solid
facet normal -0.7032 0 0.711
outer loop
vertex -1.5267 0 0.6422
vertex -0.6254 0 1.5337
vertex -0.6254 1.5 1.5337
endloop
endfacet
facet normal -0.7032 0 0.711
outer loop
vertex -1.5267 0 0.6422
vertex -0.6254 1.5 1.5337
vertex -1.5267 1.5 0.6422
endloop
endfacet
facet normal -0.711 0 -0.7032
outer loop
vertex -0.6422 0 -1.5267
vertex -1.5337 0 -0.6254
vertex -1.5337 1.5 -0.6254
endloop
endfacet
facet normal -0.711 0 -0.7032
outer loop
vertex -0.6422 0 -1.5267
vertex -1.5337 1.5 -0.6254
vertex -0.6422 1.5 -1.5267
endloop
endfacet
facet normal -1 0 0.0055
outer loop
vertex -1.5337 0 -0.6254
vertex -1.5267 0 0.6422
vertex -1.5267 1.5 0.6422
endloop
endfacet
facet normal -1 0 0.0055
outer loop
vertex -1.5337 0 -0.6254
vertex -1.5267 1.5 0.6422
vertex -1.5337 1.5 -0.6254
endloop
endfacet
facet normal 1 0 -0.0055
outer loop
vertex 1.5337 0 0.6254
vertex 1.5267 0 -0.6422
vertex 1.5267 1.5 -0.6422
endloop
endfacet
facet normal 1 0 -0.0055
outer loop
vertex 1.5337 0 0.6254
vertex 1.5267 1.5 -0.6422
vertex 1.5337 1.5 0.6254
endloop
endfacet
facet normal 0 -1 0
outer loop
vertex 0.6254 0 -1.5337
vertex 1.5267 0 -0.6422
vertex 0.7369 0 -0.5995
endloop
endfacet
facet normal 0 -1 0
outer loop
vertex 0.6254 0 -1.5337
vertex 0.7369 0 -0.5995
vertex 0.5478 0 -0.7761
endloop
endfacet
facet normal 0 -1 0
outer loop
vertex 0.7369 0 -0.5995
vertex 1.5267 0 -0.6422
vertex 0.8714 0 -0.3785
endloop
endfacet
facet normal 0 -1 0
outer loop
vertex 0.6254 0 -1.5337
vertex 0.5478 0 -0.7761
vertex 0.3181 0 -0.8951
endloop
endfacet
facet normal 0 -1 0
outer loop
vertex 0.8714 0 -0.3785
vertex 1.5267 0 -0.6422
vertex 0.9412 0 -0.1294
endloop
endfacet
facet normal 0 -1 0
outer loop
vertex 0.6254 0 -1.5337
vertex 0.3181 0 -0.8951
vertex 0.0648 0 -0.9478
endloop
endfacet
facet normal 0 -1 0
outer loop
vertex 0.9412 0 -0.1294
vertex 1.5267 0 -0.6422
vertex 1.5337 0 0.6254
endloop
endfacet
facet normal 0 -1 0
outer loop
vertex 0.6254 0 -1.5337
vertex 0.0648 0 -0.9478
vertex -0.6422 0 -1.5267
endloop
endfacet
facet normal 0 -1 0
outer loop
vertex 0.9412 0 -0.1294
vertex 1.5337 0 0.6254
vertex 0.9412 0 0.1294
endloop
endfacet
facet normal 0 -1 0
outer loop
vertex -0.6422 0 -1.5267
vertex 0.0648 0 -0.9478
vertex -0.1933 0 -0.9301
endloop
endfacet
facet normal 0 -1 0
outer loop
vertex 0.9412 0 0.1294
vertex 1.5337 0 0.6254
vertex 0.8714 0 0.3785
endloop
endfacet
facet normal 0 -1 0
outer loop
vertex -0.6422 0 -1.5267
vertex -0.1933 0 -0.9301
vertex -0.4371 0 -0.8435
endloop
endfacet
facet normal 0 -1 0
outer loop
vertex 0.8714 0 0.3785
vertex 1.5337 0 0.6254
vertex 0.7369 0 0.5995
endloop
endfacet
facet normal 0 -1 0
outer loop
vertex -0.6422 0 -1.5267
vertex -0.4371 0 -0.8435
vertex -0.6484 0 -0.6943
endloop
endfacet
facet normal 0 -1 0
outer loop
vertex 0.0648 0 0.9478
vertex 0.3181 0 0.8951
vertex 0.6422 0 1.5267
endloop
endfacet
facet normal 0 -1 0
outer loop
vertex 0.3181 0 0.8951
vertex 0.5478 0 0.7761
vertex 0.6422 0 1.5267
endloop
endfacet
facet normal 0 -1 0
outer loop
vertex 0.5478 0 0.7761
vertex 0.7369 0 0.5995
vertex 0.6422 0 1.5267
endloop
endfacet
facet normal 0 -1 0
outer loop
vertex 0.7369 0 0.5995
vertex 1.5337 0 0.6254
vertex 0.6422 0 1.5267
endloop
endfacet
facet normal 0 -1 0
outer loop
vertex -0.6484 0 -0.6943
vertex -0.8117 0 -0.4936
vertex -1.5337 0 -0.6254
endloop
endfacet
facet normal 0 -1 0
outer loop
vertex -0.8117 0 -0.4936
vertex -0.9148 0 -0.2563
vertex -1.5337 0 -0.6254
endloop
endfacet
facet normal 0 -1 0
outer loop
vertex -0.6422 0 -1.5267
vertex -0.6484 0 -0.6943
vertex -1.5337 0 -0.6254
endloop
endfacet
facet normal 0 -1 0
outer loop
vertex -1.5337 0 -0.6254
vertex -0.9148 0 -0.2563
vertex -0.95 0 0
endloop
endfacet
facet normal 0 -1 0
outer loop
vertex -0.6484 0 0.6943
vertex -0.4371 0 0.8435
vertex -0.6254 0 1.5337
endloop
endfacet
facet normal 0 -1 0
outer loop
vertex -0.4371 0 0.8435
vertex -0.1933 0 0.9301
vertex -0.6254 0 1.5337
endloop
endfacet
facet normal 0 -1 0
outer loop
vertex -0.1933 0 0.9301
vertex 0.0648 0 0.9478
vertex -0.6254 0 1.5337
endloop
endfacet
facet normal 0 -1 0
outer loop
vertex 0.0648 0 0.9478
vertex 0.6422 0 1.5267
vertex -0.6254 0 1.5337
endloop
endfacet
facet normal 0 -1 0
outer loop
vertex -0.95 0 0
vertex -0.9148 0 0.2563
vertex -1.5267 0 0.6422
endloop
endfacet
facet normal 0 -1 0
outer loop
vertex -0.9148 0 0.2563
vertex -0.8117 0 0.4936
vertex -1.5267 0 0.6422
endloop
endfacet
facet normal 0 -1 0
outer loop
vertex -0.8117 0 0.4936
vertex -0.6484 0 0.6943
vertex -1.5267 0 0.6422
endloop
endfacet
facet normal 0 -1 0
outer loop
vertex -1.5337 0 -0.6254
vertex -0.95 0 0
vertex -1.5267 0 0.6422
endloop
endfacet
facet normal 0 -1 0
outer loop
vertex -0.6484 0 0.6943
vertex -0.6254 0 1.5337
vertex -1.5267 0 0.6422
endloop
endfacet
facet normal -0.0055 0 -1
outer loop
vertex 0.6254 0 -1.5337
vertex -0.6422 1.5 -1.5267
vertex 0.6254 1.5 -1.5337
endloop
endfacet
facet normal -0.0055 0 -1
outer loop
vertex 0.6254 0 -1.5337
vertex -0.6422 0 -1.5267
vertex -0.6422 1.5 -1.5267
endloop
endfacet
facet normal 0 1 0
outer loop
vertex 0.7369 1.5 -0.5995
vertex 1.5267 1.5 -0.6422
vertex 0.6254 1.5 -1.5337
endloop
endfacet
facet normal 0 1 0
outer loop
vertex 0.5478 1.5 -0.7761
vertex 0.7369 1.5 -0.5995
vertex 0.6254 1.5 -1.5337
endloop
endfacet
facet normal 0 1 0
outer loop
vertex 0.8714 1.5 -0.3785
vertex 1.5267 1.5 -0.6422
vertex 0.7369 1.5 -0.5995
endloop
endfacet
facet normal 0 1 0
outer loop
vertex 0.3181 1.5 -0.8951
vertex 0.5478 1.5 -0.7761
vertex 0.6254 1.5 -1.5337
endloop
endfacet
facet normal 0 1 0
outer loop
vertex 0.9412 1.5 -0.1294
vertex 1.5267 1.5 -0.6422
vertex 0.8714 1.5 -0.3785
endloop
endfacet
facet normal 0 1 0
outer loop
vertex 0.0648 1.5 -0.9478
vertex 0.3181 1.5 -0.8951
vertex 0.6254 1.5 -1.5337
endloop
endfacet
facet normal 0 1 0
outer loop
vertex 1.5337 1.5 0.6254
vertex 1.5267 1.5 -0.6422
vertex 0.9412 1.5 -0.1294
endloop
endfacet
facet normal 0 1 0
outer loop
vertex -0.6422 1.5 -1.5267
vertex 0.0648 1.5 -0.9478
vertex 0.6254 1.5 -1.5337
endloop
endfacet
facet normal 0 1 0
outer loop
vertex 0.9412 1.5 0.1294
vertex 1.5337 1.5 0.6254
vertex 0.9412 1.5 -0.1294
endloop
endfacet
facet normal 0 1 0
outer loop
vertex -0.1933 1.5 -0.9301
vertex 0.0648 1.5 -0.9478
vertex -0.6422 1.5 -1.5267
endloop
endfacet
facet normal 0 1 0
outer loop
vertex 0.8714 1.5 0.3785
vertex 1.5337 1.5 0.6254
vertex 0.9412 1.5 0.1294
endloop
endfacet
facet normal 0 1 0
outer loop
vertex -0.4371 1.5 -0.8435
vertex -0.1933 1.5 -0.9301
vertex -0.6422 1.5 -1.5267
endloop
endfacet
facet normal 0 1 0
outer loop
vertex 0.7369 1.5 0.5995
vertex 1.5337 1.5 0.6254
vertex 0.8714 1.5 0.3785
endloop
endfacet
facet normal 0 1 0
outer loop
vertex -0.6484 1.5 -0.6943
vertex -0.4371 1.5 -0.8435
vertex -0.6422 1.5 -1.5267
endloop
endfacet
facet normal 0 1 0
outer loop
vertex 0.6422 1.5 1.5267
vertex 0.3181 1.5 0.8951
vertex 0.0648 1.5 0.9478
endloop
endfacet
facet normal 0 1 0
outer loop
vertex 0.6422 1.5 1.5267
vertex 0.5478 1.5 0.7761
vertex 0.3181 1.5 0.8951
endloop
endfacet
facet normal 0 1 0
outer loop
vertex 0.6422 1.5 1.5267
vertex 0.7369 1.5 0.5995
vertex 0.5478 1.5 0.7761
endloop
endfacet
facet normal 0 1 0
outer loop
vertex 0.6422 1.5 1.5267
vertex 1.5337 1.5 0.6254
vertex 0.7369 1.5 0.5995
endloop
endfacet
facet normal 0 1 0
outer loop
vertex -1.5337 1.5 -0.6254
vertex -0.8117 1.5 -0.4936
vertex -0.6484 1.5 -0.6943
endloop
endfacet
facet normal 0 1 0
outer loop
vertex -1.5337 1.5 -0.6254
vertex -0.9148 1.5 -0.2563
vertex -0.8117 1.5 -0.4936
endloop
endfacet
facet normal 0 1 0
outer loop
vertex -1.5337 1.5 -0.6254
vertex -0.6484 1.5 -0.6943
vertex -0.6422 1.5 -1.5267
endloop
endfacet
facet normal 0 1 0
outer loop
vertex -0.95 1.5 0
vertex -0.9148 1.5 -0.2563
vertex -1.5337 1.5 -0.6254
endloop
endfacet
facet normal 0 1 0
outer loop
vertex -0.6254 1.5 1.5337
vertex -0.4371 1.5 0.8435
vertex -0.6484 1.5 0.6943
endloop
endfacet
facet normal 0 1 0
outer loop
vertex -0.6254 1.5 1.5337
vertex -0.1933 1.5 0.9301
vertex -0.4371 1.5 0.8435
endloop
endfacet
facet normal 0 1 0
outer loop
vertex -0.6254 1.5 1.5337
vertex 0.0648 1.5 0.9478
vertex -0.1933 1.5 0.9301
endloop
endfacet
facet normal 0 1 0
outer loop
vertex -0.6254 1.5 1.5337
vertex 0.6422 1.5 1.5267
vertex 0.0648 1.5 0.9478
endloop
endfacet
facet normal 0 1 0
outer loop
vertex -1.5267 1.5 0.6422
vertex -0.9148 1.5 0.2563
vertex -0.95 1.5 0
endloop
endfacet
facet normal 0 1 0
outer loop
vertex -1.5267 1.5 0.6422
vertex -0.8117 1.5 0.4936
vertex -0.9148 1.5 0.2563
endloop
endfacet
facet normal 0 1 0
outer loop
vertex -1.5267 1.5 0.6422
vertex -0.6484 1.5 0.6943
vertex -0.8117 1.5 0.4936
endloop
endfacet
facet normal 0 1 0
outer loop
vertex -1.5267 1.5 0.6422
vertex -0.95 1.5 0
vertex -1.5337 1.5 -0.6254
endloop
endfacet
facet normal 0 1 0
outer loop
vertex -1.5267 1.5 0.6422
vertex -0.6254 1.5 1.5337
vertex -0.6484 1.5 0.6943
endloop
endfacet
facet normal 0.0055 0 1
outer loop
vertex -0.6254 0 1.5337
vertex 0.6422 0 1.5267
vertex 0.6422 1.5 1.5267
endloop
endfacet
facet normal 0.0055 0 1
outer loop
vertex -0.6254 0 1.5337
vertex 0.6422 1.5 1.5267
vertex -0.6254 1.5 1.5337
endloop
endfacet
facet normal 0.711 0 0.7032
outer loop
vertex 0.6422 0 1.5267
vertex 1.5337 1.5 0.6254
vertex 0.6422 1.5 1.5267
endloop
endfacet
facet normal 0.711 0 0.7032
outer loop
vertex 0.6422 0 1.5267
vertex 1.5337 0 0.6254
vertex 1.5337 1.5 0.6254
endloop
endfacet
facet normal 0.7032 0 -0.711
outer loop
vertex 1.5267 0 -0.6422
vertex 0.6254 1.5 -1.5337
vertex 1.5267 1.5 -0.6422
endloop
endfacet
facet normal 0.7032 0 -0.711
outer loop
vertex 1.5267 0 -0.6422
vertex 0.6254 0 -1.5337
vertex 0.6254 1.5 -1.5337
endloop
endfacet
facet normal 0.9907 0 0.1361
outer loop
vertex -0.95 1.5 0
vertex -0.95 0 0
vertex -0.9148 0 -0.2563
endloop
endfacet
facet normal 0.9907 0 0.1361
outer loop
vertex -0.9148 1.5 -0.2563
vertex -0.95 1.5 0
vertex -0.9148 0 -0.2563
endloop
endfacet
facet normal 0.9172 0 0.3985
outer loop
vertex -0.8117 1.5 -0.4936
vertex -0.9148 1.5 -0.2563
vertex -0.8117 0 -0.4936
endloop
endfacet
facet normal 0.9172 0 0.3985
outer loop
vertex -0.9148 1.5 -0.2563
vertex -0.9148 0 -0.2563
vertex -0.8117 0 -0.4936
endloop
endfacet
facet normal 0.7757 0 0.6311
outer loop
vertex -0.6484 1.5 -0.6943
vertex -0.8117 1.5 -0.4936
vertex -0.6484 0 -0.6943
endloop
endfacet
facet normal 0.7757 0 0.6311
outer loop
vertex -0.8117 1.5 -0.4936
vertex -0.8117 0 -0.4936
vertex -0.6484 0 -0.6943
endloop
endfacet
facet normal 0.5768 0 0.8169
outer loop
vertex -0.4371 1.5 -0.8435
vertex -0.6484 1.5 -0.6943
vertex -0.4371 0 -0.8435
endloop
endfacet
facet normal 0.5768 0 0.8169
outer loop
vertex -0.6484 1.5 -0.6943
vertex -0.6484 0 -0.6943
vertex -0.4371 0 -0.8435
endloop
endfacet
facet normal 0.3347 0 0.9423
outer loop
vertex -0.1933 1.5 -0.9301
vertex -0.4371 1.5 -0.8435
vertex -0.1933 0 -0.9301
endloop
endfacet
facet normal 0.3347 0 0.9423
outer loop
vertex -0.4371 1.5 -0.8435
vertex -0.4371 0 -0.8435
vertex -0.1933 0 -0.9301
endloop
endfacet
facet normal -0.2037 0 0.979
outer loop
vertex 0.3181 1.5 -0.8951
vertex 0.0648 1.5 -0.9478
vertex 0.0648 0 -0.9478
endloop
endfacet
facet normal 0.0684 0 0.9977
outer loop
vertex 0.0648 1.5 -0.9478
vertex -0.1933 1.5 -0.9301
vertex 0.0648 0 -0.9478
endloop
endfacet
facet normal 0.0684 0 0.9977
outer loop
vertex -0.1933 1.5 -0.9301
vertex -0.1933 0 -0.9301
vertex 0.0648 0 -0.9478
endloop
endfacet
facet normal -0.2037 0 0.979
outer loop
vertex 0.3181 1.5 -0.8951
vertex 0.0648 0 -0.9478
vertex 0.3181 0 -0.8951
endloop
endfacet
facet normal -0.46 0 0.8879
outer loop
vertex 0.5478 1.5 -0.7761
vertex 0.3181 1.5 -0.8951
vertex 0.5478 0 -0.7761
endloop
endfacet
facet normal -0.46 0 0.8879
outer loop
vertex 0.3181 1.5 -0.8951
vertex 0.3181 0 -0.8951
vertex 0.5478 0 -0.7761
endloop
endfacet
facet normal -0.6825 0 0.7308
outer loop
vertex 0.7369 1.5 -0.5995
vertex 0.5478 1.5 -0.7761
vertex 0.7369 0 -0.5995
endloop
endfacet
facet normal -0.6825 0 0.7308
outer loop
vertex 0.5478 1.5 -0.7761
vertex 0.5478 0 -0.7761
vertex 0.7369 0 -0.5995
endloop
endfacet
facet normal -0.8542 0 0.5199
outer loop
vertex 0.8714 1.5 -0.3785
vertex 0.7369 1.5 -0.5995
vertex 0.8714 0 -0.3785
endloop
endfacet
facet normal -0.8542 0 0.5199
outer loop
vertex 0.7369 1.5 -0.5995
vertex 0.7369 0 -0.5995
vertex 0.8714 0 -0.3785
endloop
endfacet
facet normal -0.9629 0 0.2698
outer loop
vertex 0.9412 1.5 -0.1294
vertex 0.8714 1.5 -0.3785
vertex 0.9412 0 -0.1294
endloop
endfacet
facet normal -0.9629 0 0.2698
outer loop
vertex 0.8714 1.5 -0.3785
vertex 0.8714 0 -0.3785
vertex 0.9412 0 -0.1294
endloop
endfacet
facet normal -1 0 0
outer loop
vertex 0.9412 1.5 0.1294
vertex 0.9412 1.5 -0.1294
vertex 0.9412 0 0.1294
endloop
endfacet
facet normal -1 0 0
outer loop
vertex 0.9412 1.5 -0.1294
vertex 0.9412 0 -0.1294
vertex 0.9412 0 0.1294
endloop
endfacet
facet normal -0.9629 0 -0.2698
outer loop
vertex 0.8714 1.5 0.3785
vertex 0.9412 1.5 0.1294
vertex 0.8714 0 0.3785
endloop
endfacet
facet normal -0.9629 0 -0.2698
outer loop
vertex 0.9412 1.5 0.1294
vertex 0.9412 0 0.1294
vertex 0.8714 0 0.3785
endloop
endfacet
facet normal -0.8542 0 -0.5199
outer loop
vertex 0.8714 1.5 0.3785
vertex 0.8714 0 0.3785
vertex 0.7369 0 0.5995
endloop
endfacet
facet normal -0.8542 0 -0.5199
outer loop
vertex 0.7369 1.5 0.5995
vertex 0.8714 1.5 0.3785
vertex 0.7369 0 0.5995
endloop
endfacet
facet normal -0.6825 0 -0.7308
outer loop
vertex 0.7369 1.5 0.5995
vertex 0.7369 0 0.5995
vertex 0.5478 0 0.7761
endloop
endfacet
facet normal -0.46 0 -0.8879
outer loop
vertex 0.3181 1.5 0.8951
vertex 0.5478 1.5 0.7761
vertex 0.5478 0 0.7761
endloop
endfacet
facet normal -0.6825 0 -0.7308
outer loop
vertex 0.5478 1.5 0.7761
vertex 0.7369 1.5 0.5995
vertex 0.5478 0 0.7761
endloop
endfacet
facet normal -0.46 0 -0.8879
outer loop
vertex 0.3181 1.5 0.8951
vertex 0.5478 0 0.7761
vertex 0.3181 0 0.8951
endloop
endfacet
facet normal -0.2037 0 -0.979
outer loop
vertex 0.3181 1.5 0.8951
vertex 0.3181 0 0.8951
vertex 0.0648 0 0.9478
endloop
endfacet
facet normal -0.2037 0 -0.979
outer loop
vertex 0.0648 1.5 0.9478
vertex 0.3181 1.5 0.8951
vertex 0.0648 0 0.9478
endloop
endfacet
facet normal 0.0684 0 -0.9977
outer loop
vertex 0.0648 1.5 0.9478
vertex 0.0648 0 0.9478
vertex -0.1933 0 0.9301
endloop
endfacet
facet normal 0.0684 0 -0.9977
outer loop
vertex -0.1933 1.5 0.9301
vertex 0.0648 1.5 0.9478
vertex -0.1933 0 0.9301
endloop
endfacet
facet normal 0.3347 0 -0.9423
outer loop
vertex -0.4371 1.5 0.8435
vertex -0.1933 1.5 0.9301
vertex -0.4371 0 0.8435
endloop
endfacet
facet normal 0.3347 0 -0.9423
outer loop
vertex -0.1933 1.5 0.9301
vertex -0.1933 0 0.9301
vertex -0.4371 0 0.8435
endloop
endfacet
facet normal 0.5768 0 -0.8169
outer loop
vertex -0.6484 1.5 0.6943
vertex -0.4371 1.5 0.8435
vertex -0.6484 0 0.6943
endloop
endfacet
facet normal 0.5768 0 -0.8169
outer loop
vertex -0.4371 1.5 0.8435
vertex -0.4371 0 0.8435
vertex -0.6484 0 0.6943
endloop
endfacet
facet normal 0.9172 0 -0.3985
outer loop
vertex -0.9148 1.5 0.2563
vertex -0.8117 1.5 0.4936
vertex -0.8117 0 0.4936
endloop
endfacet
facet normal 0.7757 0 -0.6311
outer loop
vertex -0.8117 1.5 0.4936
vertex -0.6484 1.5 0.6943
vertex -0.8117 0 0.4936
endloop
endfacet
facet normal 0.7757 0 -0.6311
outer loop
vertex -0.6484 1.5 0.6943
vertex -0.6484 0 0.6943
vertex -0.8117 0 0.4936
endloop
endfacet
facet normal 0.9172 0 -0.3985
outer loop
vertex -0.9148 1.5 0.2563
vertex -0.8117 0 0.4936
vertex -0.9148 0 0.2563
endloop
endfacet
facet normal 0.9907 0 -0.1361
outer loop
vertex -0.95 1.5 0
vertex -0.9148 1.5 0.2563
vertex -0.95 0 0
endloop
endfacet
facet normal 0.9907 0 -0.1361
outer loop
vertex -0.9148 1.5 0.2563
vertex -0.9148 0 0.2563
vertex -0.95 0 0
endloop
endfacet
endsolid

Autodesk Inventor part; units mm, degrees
ref_plane "YZ Plane" through (0, 0, 0) normal (1, 0, 0) x (0, 1, 0)
ref_plane "XZ Plane" through (0, 0, 0) normal (0, 1, 0) x (-1, 0, 0)
ref_plane "XY Plane" through (0, 0, 0) normal (0, 0, 1) x (1, 0, 0)
sketch "Sketch1" plane through (0, 0, 0) normal (0, 1, 0) x (-1, 0, 0)
  circle A0 centre (0, 0) radius 0.95
  line L0 (0.6422, -1.5267) -> (-0.6254, -1.5337)
  line L1 (-0.6254, -1.5337) -> (-1.5267, -0.6422)
  line L2 (-1.5267, -0.6422) -> (-1.5337, 0.6254)
  line L3 (-1.5337, 0.6254) -> (-0.6422, 1.5267)
  line L4 (-0.6422, 1.5267) -> (0.6254, 1.5337)
  line L5 (0.6254, 1.5337) -> (1.5267, 0.6422)
  line L6 (1.5267, 0.6422) -> (1.5337, -0.6254)
  line L7 (1.5337, -0.6254) -> (0.6422, -1.5267)
  dimension "d0" = 1.9
extrude "Extrusion1" add sketch "Sketch1" along normal blind 1.5
properties part number "nut"
